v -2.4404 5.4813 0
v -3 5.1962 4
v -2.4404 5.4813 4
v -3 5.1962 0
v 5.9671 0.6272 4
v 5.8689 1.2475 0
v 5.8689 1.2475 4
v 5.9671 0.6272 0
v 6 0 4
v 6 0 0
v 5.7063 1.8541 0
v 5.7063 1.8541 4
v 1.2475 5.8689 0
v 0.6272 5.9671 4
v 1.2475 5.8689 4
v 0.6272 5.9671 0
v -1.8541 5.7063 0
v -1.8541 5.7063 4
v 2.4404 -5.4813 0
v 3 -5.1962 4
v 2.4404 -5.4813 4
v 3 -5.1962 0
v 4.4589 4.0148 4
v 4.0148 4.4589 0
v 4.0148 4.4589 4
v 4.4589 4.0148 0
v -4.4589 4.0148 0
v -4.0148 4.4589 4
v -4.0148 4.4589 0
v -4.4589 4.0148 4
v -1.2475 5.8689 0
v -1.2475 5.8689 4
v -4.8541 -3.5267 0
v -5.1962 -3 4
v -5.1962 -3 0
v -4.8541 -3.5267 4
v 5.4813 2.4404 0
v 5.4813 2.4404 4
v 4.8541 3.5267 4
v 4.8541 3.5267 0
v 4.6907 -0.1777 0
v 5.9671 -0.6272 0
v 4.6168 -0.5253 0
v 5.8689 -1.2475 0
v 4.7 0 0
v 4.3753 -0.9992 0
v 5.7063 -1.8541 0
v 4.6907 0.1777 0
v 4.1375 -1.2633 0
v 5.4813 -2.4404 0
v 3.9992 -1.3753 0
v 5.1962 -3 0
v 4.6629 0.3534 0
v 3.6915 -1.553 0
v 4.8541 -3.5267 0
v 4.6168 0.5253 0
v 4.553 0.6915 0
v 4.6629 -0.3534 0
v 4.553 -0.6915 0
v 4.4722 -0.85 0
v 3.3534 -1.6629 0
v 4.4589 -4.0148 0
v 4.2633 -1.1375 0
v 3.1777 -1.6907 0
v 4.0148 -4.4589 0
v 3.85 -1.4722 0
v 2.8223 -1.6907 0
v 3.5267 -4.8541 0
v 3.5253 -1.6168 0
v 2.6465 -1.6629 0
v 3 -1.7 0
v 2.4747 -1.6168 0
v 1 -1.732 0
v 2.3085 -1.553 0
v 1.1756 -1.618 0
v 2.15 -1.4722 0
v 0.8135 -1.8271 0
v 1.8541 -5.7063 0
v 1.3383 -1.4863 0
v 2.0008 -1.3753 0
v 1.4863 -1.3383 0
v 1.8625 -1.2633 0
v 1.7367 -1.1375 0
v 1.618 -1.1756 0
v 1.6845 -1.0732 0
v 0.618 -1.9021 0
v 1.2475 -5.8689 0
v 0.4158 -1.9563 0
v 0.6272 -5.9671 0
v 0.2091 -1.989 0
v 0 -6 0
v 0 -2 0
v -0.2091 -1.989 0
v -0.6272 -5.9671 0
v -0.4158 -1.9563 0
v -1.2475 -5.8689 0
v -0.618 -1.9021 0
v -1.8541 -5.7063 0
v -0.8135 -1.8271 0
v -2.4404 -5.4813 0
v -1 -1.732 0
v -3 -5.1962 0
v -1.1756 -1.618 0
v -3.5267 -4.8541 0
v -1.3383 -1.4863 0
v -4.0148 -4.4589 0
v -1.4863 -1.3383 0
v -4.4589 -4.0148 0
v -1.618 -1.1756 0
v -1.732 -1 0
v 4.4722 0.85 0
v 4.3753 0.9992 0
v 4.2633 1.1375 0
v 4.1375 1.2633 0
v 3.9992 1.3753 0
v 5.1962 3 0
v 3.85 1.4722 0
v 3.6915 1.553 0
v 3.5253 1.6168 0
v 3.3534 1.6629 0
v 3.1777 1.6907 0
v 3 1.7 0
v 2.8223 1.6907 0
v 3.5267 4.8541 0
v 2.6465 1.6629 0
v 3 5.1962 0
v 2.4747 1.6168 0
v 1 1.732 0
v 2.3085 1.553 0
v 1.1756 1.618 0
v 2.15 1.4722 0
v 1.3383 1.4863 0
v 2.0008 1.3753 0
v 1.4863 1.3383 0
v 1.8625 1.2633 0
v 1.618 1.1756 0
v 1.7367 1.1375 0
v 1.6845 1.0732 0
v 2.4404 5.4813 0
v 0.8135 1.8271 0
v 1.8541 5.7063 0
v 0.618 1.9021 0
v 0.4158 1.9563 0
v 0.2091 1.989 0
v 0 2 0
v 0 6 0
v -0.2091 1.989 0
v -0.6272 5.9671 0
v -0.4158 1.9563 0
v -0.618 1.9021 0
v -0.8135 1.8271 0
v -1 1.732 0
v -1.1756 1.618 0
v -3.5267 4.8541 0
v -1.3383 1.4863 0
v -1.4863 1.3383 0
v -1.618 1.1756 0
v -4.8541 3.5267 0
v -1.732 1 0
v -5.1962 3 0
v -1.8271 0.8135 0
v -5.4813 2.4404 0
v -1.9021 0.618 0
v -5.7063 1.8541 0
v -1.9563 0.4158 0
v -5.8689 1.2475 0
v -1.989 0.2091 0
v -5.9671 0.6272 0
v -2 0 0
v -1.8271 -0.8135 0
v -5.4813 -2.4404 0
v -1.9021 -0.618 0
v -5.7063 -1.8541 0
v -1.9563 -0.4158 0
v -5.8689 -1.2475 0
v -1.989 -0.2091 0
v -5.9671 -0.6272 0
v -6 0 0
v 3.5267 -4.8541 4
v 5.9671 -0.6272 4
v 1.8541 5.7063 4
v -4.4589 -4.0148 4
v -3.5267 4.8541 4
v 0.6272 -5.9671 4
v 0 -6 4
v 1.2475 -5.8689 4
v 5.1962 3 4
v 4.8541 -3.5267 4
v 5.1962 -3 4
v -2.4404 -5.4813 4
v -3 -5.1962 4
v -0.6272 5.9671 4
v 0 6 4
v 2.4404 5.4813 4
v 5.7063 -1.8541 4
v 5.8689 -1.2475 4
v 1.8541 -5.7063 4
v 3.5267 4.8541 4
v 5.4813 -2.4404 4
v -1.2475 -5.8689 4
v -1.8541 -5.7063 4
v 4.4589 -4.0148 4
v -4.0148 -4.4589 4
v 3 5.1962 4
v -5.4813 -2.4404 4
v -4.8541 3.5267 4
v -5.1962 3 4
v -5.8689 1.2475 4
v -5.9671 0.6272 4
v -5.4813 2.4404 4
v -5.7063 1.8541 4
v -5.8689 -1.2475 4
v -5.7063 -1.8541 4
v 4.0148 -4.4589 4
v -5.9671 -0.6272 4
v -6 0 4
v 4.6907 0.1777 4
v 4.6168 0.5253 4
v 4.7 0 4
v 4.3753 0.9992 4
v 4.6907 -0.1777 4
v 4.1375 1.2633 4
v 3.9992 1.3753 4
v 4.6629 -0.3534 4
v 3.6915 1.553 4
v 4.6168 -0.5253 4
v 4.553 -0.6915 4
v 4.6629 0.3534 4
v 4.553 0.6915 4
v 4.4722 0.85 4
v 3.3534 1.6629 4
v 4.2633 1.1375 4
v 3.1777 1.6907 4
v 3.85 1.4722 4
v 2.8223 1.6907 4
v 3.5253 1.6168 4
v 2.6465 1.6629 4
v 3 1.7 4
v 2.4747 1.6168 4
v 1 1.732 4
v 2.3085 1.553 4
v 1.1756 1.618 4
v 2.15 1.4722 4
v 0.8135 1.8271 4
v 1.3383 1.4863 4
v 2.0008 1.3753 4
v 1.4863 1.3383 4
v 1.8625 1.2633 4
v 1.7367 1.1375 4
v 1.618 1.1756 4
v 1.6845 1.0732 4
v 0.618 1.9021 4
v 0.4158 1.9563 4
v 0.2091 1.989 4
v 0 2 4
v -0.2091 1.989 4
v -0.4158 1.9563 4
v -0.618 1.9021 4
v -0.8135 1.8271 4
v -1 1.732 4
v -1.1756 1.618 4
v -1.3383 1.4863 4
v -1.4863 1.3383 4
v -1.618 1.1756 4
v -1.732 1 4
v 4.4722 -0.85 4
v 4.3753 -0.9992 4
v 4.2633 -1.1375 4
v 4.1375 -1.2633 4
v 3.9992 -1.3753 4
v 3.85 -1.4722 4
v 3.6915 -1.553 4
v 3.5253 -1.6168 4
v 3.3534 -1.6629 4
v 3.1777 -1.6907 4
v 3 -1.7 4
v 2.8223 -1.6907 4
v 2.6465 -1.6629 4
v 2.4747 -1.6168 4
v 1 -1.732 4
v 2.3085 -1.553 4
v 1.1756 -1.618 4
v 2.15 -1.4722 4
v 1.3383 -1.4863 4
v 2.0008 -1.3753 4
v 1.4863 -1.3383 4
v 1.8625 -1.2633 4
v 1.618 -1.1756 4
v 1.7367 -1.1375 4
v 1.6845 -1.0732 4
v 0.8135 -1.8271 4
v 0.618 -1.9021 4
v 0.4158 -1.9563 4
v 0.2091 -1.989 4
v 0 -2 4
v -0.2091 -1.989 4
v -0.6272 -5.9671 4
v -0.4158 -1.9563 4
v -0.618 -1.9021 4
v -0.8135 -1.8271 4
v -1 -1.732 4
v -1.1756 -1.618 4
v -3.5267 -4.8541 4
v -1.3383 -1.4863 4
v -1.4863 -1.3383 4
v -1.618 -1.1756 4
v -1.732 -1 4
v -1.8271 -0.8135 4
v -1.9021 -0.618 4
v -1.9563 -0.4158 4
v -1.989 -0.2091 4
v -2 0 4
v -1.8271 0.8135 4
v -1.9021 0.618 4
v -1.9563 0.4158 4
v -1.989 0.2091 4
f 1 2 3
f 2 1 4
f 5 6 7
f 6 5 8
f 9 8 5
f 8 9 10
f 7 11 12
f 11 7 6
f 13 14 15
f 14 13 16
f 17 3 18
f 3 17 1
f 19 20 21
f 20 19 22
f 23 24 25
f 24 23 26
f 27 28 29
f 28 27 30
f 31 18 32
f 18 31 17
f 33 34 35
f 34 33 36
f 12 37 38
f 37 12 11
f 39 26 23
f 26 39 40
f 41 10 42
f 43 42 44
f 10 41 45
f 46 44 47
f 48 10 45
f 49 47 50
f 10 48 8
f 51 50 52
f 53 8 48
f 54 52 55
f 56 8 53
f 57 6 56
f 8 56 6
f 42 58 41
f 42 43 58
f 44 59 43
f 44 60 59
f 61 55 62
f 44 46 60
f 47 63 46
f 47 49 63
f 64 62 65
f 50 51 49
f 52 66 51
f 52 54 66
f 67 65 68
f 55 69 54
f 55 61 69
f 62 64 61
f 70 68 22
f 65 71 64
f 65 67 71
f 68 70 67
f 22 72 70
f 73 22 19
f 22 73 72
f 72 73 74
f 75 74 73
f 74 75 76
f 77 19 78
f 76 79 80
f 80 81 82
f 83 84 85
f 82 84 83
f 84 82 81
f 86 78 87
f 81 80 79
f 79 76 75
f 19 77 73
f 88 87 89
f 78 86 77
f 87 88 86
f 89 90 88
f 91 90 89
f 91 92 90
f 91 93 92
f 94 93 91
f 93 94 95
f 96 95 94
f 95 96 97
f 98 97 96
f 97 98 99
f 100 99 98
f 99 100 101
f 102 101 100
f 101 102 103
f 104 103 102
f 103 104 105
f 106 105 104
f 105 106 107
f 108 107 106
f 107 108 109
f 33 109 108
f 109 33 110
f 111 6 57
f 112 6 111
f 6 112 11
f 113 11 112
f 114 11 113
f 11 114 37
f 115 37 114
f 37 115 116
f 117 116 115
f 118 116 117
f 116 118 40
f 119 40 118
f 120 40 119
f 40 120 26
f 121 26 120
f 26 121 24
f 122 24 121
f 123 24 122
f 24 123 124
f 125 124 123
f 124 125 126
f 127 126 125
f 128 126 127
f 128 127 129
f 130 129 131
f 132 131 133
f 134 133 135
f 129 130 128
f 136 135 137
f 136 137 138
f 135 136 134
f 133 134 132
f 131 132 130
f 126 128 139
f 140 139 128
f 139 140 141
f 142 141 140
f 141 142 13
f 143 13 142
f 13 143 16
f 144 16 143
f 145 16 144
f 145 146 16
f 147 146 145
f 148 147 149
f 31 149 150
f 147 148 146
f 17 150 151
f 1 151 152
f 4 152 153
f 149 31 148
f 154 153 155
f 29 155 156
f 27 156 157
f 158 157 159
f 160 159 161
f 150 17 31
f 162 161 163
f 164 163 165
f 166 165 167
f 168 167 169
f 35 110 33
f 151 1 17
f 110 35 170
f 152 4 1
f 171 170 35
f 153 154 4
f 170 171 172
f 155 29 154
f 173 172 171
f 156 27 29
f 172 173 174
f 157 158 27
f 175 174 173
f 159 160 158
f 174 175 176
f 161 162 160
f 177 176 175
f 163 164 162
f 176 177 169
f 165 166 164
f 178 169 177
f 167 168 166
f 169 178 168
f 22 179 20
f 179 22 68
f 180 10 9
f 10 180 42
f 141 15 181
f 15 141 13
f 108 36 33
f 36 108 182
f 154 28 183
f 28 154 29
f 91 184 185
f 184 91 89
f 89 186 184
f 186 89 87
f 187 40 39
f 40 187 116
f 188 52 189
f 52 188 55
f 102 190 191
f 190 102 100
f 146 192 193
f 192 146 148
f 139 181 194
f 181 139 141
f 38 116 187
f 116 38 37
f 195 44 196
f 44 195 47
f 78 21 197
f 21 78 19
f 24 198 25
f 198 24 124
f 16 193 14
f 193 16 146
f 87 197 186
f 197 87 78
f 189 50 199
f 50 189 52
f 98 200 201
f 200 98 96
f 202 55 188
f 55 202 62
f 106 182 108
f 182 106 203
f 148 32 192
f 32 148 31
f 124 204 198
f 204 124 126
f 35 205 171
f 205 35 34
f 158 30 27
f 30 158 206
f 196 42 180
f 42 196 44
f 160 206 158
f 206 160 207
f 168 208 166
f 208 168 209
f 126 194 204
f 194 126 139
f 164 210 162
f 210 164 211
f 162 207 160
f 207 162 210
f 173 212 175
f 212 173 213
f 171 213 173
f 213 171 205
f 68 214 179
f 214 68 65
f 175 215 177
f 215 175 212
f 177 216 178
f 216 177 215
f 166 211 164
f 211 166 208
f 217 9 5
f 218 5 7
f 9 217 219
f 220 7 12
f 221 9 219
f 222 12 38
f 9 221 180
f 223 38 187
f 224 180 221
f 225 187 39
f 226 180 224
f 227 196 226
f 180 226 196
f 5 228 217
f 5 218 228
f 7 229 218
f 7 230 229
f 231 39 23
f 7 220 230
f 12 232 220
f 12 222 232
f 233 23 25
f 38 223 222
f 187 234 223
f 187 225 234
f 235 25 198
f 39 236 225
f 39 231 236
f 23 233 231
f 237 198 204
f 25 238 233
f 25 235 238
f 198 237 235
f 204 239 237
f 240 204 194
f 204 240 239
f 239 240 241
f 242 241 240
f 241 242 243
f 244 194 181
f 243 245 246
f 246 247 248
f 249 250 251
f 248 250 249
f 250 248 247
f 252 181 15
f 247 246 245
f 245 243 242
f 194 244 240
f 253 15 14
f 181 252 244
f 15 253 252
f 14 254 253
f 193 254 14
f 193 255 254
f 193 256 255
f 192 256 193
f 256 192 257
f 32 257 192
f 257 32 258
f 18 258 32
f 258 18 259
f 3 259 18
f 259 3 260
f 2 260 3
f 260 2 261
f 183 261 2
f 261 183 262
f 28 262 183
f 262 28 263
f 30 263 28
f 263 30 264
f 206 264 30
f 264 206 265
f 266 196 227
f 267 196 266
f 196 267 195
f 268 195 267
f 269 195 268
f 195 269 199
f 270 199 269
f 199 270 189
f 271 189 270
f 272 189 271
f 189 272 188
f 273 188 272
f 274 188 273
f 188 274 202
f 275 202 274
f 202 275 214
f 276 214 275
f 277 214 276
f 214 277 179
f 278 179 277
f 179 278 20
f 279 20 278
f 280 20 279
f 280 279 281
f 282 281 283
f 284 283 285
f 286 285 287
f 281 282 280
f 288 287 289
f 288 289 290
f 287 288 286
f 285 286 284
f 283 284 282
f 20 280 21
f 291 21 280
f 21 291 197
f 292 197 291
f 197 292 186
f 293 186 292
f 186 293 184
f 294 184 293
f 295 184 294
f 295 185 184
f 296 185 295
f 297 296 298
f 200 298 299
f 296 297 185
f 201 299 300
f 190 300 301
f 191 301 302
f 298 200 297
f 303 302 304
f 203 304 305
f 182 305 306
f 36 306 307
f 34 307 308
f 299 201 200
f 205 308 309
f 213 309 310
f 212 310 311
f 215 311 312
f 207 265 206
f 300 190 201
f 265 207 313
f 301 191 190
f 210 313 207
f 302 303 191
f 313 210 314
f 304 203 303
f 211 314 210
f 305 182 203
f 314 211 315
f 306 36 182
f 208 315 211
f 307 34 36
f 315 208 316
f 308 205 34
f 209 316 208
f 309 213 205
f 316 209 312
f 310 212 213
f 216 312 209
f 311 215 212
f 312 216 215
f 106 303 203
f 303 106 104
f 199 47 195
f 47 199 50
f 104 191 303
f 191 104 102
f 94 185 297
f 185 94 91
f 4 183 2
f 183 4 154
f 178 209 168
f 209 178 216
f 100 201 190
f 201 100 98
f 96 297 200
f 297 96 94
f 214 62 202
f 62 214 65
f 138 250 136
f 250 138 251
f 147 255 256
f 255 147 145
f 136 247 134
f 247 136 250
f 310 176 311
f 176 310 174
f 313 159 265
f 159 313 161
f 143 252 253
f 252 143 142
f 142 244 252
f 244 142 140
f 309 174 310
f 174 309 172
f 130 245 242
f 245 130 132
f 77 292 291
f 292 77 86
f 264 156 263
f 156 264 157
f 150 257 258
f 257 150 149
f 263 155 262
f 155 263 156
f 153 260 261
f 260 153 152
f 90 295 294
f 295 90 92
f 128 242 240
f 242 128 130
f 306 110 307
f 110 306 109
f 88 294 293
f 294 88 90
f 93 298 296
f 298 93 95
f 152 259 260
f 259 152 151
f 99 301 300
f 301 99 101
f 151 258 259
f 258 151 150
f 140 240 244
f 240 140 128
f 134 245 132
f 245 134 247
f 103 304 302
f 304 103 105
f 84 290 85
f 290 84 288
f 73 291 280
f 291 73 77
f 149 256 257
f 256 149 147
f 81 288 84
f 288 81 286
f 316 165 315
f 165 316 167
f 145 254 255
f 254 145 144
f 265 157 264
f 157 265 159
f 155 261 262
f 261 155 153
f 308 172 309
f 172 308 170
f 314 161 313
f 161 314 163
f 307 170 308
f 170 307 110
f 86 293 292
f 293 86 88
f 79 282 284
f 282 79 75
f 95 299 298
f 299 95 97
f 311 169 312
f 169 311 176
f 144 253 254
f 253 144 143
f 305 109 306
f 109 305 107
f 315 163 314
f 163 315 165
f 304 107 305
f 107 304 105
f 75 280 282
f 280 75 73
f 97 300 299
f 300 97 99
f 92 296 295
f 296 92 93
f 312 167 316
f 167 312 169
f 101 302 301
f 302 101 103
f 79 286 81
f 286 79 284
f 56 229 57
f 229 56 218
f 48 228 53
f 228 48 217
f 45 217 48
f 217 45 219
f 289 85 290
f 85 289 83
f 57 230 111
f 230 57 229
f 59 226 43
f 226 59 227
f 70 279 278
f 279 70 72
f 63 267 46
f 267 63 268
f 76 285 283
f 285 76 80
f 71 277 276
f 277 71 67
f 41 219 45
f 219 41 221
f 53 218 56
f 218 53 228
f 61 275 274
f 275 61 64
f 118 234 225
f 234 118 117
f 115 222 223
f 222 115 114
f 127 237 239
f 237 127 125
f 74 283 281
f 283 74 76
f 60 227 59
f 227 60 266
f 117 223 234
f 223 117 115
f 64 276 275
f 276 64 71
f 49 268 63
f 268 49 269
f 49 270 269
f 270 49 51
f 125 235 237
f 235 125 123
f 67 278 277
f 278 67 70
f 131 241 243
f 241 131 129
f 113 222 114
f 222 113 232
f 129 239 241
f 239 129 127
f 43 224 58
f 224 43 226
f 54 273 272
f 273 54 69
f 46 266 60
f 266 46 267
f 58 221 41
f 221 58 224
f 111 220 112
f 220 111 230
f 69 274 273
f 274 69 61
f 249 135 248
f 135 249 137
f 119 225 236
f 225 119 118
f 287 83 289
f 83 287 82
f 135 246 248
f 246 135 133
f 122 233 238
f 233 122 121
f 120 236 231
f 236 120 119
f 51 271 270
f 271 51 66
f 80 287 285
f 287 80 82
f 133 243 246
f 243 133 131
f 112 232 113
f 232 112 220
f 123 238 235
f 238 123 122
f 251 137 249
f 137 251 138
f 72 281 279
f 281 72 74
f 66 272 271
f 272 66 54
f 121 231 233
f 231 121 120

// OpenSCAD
// Closed cable guide ring.
$fn = 60;
eps = 0.02;
cable_d = 4;
outer_d = 12;
thickness = 4;
difference() { cylinder(d=outer_d,h=thickness); translate([0,0,-eps]) cylinder(d=cable_d,h=thickness+2*eps); translate([outer_d/2-3,0,-eps]) cylinder(d=3.4,h=thickness+2*eps); }
